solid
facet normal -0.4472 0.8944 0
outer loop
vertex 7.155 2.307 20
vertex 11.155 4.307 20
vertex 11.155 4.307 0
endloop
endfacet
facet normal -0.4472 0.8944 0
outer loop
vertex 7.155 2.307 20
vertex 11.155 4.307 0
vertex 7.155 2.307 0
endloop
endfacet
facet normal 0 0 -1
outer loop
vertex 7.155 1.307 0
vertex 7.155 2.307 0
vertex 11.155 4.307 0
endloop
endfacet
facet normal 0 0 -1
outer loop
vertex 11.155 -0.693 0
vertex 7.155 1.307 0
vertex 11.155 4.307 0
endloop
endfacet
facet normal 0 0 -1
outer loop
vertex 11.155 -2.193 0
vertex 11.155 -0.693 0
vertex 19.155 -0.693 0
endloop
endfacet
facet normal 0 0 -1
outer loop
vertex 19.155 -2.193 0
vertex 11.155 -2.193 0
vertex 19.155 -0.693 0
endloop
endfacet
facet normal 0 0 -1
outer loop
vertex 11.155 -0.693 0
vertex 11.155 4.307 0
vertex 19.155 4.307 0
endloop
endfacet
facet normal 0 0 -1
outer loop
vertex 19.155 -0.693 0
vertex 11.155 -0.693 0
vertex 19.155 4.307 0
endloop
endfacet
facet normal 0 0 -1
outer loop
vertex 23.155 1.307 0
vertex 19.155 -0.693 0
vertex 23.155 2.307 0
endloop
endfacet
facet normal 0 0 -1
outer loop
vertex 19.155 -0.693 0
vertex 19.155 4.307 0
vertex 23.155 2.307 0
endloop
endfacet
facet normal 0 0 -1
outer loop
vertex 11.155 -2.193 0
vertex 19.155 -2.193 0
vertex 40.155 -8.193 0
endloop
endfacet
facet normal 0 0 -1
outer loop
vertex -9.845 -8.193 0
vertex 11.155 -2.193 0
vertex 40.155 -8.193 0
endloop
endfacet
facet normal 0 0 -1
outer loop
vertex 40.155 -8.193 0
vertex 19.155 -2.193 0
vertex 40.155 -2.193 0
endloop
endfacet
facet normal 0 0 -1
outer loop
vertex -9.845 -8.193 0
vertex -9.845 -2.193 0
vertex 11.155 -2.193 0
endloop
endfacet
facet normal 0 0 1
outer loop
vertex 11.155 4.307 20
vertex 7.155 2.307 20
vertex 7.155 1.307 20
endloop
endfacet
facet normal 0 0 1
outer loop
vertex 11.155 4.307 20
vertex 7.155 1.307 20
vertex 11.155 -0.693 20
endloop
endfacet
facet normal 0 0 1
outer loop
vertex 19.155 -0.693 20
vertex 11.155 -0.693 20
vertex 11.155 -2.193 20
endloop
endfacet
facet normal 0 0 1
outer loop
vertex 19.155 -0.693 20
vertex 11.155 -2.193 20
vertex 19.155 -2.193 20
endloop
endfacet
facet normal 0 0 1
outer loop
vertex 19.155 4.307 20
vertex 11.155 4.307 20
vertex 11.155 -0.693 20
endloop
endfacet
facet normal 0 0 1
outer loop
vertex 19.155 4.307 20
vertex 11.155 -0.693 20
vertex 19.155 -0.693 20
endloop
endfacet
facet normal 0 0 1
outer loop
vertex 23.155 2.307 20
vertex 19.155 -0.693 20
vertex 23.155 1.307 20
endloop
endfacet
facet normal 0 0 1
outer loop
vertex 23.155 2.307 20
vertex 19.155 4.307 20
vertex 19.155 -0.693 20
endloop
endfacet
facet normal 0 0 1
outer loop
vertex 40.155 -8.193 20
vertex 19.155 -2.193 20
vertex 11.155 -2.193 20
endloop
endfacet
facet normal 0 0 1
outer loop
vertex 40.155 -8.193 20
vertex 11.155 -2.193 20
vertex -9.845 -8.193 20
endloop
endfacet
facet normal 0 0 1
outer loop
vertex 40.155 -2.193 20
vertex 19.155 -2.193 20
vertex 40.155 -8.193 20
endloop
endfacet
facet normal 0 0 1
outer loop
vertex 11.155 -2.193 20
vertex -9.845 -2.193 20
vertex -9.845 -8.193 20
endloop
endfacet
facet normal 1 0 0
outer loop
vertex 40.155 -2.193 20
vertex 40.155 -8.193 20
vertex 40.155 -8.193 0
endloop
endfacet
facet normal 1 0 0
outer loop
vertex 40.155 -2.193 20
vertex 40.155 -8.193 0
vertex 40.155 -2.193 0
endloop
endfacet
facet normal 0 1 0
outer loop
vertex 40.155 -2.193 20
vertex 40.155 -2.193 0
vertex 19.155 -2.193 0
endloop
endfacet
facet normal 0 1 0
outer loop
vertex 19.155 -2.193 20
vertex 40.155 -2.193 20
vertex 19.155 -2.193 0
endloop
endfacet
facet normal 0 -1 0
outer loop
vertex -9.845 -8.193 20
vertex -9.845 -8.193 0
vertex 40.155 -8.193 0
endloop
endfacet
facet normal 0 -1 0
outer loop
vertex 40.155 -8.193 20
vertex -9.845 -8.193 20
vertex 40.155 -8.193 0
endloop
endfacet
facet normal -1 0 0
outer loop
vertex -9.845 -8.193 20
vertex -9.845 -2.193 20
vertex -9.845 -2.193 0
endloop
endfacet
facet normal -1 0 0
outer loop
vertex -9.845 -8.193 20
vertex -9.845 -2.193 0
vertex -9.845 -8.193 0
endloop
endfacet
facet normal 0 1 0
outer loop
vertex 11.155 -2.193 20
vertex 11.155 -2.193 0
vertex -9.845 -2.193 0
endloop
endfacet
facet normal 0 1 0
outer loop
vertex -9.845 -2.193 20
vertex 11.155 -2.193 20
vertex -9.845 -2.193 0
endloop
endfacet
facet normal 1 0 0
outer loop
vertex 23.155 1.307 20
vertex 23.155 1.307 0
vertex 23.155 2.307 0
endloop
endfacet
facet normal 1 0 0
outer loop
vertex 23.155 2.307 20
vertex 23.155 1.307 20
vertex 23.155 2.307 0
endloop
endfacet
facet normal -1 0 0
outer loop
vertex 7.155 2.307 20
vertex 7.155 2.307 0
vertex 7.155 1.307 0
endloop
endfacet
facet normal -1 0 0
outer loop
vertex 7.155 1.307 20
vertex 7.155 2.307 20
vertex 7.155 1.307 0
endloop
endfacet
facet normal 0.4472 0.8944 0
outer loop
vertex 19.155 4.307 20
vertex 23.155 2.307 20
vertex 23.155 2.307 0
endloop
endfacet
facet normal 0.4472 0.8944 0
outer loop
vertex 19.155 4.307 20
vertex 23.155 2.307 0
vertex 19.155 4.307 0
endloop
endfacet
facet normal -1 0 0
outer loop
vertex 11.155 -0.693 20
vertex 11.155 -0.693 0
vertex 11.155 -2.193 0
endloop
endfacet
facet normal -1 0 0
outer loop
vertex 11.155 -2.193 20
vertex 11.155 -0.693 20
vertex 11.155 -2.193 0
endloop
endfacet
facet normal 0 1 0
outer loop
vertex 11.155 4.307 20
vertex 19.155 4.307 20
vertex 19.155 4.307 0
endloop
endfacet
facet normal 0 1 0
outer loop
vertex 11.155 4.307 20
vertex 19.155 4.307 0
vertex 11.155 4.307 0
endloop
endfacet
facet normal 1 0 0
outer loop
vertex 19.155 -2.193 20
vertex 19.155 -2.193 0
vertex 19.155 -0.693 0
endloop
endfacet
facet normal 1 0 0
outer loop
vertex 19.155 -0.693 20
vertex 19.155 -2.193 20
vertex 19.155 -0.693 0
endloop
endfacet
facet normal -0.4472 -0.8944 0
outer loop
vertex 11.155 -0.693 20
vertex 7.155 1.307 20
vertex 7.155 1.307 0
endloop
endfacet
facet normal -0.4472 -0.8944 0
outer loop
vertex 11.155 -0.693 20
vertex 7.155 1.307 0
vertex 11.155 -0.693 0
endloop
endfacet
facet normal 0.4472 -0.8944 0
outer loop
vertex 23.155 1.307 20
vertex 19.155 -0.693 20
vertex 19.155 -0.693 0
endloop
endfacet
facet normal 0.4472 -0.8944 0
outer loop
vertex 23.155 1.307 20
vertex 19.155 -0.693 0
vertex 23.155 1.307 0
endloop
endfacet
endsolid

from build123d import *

# Parameters (mm, degrees)
EXTRUDE_1_DEPTH = 20


with BuildPart() as part:
    # Эскиз1 → Бобышка-Вытянуть1 (new body)
    with BuildSketch(Plane.XY):
        Polygon((-9.845304567, -8.192930284), (40.154695433, -8.192930284), (40.154695433, -2.192930284), (19.154695433, -2.192930284), (19.154695433, -0.692930284), (23.154695433, 1.307069716), (23.154695433, 2.307069716), (19.154695433, 4.307069716), (11.154695433, 4.307069716), (7.154695433, 2.307069716), (7.154695433, 1.307069716), (11.154695433, -0.692930284), (11.154695433, -2.192930284), (-9.845304567, -2.192930284), align=None)
    extrude(amount=EXTRUDE_1_DEPTH)


solid = part.part
